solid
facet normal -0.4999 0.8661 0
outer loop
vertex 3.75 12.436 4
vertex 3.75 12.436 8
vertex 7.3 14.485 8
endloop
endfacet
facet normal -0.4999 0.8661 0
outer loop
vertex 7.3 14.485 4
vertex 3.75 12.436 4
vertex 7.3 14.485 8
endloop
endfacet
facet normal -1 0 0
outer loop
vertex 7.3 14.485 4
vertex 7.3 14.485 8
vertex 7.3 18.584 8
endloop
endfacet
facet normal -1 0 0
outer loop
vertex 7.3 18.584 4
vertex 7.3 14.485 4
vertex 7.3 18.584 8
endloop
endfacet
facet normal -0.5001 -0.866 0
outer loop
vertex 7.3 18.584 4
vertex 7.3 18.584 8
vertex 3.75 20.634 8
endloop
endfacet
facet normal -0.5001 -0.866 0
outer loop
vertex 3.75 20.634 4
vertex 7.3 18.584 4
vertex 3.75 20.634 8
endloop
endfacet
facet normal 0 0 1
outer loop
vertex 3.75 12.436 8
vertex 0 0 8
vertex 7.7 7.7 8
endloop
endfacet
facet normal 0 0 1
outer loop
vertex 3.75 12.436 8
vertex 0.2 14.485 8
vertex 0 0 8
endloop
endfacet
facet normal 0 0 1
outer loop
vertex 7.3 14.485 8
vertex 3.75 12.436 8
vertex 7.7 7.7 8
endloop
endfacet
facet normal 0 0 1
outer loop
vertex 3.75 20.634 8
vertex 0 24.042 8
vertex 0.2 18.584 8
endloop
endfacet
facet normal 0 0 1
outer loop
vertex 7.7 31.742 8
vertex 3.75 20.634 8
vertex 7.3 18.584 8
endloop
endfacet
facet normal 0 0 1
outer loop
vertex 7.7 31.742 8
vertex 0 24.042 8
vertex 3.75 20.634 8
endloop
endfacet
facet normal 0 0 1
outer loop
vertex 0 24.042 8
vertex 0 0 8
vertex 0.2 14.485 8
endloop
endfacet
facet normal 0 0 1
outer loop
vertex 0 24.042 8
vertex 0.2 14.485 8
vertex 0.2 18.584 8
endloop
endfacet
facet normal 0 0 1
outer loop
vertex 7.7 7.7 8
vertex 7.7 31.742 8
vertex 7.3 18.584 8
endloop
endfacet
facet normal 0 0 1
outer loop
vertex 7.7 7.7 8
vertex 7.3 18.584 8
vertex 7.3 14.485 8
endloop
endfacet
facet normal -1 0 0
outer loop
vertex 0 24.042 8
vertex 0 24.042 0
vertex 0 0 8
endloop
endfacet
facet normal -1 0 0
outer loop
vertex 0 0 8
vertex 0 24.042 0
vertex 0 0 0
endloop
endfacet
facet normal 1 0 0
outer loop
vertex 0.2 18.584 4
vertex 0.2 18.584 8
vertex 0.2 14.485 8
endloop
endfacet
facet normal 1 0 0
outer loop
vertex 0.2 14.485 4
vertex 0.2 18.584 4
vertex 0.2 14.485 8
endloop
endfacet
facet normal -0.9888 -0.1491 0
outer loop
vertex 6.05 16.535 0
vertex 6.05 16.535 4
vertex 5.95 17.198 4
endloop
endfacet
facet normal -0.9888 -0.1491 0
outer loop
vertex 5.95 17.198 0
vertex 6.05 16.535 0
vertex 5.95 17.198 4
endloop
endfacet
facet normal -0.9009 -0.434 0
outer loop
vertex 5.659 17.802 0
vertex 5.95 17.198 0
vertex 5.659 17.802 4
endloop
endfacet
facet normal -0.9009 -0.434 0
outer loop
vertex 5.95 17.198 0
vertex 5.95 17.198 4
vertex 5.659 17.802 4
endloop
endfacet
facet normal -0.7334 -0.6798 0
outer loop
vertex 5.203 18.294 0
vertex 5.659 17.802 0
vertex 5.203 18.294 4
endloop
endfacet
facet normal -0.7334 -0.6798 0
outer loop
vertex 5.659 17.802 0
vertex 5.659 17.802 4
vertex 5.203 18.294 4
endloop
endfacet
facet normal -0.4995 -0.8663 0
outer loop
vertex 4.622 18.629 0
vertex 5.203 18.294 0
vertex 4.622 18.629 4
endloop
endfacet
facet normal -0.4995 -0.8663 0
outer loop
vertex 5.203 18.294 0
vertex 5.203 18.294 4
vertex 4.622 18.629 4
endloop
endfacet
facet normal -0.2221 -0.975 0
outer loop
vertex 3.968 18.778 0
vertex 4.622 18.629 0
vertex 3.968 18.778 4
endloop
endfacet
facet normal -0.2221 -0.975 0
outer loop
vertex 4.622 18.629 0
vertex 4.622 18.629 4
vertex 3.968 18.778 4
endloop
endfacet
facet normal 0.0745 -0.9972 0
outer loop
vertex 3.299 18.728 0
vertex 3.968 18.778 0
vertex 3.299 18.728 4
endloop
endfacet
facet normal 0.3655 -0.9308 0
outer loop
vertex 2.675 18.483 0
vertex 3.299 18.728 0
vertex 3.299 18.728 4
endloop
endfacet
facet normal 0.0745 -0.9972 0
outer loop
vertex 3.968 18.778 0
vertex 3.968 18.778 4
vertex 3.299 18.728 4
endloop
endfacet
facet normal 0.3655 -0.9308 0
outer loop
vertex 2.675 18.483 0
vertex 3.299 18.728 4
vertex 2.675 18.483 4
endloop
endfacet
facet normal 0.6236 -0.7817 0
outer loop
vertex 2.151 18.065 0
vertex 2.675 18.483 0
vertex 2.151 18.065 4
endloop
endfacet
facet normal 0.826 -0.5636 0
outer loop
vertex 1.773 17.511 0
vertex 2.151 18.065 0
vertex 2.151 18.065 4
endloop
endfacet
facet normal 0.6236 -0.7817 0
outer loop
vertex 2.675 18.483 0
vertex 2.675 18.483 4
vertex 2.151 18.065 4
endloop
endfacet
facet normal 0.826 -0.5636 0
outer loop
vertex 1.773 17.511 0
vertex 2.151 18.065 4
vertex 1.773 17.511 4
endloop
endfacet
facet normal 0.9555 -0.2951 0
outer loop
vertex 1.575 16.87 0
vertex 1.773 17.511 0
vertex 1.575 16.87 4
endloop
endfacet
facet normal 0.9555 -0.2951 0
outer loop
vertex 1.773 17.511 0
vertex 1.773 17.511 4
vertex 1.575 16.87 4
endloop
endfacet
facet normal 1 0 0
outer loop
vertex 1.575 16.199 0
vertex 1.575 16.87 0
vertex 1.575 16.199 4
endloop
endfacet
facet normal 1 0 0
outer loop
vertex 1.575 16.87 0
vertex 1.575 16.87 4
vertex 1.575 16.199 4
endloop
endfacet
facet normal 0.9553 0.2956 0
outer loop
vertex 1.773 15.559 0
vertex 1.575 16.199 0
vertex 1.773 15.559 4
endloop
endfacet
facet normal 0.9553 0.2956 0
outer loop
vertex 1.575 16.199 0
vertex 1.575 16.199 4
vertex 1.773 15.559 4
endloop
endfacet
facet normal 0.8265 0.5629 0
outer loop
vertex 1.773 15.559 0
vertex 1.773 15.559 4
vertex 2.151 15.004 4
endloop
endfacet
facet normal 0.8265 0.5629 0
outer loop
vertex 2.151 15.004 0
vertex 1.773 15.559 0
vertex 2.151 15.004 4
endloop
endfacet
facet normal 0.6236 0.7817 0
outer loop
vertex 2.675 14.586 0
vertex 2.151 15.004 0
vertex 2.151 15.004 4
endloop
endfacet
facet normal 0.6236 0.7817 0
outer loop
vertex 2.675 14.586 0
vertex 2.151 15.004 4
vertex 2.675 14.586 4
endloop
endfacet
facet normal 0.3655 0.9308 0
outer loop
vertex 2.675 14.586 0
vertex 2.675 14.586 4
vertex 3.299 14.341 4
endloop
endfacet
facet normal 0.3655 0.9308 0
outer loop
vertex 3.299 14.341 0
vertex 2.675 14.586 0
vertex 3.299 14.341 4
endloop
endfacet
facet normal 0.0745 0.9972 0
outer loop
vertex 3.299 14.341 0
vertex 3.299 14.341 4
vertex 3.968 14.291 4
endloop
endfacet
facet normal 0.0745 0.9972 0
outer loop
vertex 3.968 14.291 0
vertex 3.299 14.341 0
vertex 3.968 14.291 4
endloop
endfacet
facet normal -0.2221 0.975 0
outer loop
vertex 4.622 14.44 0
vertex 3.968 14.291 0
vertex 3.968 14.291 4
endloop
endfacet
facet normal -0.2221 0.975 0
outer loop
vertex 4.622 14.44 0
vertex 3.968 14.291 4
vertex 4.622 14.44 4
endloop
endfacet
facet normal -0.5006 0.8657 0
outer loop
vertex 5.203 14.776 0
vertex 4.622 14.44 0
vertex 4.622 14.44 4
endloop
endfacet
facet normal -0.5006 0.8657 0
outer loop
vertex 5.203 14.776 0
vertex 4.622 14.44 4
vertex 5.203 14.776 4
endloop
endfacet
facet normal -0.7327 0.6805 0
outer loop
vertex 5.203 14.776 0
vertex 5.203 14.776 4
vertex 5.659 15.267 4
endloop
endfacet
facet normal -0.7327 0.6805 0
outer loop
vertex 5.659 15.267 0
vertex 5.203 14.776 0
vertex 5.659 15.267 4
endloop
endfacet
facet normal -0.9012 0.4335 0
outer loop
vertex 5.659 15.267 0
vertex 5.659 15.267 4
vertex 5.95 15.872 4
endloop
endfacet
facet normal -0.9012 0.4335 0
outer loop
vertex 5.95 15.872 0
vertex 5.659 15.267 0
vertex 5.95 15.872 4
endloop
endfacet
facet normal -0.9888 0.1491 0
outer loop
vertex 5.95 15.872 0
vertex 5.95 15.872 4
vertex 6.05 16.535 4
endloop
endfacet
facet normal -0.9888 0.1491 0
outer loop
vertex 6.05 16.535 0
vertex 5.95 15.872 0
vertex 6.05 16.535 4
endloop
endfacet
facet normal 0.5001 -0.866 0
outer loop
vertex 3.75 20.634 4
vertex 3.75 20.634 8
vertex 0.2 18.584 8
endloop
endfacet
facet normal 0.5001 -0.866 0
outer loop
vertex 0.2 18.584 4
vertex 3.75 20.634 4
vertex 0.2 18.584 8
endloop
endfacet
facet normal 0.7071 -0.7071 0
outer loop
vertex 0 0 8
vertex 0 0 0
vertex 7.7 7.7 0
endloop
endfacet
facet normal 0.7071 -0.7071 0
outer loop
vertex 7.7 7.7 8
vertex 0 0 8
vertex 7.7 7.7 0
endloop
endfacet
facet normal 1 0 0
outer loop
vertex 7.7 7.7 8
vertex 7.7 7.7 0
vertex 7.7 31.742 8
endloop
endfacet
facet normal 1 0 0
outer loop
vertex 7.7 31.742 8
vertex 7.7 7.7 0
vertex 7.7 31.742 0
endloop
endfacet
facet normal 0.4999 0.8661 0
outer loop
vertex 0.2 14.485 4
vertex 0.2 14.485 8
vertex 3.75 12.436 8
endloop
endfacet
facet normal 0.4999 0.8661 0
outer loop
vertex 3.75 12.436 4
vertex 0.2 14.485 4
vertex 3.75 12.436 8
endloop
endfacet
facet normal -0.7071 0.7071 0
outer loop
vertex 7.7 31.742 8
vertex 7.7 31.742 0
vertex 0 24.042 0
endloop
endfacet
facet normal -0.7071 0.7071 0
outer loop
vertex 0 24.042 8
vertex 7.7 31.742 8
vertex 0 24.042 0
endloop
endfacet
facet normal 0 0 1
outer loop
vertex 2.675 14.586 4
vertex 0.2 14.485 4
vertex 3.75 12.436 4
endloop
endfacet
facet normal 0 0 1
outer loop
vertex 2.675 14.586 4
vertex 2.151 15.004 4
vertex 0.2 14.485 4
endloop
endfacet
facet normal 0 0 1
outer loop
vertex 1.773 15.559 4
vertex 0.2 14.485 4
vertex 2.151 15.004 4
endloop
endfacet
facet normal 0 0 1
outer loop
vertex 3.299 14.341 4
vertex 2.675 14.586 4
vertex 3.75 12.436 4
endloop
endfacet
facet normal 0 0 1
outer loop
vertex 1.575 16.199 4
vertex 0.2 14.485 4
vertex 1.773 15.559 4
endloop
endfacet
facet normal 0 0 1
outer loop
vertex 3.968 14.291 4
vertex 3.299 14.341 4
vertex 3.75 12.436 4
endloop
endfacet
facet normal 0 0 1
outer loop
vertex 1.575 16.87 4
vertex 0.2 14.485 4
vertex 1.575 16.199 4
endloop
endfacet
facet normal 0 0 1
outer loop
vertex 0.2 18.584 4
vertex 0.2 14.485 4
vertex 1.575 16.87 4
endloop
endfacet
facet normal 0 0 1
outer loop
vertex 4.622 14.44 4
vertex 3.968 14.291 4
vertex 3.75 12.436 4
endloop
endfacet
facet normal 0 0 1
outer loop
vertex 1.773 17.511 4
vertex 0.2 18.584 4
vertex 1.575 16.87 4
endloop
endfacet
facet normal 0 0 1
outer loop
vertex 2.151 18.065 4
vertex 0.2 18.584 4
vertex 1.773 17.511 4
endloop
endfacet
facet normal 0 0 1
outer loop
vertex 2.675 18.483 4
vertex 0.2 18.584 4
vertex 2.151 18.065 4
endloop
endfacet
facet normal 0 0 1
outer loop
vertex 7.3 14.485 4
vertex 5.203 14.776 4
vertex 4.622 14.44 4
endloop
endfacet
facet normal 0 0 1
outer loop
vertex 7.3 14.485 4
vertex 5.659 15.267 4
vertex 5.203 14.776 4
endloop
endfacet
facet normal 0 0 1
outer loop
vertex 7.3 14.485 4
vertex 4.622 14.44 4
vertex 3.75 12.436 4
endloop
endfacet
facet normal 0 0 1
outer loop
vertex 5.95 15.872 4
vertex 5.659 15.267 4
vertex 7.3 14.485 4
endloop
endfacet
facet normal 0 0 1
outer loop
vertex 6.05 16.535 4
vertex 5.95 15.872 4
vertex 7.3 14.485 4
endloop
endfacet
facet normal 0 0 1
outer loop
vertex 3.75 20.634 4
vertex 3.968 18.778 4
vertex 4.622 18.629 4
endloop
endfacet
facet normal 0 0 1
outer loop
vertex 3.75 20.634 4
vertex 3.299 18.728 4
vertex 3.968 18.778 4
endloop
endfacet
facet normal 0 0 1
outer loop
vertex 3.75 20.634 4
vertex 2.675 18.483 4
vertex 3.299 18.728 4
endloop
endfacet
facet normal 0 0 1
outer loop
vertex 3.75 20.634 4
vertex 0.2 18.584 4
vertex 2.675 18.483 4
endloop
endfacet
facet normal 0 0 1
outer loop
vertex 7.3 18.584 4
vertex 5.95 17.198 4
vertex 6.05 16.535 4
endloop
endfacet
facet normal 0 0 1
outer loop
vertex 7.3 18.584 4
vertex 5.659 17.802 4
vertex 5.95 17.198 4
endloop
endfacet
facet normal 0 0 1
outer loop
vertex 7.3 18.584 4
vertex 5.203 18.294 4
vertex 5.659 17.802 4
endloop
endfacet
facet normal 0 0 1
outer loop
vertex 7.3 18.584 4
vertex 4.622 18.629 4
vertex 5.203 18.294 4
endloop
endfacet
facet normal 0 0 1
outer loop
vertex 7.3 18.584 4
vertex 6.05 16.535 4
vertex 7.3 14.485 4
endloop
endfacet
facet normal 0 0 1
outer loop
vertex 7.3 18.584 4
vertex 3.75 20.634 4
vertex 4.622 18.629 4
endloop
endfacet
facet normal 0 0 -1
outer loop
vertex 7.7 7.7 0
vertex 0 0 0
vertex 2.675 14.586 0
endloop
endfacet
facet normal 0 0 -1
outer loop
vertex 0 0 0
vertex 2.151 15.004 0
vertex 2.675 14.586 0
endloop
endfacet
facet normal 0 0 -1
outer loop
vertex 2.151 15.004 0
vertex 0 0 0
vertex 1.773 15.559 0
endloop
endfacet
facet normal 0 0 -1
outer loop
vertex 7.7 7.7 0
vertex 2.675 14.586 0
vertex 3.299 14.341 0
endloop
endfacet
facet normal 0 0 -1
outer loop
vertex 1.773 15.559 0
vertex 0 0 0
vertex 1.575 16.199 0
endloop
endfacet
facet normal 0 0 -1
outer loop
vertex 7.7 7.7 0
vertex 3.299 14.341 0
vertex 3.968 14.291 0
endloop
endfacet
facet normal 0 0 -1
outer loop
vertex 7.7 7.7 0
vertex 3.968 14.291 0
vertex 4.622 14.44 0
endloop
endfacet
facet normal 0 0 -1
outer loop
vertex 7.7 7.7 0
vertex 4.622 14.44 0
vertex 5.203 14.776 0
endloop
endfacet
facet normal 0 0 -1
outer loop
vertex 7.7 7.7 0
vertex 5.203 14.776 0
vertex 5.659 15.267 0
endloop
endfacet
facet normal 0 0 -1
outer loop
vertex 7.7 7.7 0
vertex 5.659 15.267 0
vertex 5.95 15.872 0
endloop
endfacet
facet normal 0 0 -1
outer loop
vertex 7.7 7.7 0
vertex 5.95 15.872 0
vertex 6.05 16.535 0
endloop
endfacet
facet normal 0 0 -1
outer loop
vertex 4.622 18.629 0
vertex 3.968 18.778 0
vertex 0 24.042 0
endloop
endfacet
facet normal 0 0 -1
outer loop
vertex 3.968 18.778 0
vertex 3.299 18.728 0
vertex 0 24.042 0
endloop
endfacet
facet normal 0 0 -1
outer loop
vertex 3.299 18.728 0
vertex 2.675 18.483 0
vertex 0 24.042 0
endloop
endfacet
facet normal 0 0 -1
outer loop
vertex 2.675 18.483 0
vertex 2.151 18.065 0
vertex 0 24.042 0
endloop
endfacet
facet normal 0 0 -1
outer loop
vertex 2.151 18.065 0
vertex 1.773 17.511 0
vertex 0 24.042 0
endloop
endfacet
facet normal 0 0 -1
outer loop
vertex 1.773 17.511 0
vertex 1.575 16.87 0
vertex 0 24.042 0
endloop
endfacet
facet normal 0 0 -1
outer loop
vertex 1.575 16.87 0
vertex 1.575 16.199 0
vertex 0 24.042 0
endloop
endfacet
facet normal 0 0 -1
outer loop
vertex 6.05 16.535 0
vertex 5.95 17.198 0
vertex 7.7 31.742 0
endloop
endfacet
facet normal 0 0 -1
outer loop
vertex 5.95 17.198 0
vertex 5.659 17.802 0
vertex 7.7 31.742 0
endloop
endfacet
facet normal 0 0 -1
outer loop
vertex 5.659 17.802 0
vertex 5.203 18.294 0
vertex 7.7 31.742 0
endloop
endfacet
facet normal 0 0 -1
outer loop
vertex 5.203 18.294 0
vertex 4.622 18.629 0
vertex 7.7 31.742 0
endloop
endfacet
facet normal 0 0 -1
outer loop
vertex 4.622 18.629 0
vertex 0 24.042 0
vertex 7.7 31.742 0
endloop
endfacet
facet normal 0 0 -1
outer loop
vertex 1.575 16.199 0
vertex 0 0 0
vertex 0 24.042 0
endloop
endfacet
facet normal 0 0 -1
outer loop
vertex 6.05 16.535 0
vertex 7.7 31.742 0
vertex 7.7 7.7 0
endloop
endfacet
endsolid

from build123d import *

# Parameters (mm, degrees)
F1_DEPTH = 8
F3_DEPTH = 4
F4_R     = 2.25
F5_DEPTH = 25


with BuildPart() as f1:
    # F0 (on Top) → F1 (new body)
    with BuildSketch(Plane.XY):
        Polygon((0, 24.041631), (0, 0), (7.7, 7.7), (7.7, 31.741631), align=None)
    extrude(amount=F1_DEPTH)

    # F2 (on face) → F3 (cut)
    with BuildSketch(Plane.XY.offset(8)):
        Polygon((3.75, 12.435577), (7.3, 14.485171), (7.3, 18.584358), (3.75, 20.633951), (0.2, 18.584358), (0.2, 14.485171), align=None)
    extrude(amount=-F3_DEPTH, mode=Mode.SUBTRACT)

    # F4 (on face) → F5 (cut)
    with BuildSketch(Plane.XY.offset(4)):
        with Locations((3.8, 16.534764)):
            Circle(F4_R)
    extrude(amount=-F5_DEPTH, mode=Mode.SUBTRACT)


solid = f1.part
